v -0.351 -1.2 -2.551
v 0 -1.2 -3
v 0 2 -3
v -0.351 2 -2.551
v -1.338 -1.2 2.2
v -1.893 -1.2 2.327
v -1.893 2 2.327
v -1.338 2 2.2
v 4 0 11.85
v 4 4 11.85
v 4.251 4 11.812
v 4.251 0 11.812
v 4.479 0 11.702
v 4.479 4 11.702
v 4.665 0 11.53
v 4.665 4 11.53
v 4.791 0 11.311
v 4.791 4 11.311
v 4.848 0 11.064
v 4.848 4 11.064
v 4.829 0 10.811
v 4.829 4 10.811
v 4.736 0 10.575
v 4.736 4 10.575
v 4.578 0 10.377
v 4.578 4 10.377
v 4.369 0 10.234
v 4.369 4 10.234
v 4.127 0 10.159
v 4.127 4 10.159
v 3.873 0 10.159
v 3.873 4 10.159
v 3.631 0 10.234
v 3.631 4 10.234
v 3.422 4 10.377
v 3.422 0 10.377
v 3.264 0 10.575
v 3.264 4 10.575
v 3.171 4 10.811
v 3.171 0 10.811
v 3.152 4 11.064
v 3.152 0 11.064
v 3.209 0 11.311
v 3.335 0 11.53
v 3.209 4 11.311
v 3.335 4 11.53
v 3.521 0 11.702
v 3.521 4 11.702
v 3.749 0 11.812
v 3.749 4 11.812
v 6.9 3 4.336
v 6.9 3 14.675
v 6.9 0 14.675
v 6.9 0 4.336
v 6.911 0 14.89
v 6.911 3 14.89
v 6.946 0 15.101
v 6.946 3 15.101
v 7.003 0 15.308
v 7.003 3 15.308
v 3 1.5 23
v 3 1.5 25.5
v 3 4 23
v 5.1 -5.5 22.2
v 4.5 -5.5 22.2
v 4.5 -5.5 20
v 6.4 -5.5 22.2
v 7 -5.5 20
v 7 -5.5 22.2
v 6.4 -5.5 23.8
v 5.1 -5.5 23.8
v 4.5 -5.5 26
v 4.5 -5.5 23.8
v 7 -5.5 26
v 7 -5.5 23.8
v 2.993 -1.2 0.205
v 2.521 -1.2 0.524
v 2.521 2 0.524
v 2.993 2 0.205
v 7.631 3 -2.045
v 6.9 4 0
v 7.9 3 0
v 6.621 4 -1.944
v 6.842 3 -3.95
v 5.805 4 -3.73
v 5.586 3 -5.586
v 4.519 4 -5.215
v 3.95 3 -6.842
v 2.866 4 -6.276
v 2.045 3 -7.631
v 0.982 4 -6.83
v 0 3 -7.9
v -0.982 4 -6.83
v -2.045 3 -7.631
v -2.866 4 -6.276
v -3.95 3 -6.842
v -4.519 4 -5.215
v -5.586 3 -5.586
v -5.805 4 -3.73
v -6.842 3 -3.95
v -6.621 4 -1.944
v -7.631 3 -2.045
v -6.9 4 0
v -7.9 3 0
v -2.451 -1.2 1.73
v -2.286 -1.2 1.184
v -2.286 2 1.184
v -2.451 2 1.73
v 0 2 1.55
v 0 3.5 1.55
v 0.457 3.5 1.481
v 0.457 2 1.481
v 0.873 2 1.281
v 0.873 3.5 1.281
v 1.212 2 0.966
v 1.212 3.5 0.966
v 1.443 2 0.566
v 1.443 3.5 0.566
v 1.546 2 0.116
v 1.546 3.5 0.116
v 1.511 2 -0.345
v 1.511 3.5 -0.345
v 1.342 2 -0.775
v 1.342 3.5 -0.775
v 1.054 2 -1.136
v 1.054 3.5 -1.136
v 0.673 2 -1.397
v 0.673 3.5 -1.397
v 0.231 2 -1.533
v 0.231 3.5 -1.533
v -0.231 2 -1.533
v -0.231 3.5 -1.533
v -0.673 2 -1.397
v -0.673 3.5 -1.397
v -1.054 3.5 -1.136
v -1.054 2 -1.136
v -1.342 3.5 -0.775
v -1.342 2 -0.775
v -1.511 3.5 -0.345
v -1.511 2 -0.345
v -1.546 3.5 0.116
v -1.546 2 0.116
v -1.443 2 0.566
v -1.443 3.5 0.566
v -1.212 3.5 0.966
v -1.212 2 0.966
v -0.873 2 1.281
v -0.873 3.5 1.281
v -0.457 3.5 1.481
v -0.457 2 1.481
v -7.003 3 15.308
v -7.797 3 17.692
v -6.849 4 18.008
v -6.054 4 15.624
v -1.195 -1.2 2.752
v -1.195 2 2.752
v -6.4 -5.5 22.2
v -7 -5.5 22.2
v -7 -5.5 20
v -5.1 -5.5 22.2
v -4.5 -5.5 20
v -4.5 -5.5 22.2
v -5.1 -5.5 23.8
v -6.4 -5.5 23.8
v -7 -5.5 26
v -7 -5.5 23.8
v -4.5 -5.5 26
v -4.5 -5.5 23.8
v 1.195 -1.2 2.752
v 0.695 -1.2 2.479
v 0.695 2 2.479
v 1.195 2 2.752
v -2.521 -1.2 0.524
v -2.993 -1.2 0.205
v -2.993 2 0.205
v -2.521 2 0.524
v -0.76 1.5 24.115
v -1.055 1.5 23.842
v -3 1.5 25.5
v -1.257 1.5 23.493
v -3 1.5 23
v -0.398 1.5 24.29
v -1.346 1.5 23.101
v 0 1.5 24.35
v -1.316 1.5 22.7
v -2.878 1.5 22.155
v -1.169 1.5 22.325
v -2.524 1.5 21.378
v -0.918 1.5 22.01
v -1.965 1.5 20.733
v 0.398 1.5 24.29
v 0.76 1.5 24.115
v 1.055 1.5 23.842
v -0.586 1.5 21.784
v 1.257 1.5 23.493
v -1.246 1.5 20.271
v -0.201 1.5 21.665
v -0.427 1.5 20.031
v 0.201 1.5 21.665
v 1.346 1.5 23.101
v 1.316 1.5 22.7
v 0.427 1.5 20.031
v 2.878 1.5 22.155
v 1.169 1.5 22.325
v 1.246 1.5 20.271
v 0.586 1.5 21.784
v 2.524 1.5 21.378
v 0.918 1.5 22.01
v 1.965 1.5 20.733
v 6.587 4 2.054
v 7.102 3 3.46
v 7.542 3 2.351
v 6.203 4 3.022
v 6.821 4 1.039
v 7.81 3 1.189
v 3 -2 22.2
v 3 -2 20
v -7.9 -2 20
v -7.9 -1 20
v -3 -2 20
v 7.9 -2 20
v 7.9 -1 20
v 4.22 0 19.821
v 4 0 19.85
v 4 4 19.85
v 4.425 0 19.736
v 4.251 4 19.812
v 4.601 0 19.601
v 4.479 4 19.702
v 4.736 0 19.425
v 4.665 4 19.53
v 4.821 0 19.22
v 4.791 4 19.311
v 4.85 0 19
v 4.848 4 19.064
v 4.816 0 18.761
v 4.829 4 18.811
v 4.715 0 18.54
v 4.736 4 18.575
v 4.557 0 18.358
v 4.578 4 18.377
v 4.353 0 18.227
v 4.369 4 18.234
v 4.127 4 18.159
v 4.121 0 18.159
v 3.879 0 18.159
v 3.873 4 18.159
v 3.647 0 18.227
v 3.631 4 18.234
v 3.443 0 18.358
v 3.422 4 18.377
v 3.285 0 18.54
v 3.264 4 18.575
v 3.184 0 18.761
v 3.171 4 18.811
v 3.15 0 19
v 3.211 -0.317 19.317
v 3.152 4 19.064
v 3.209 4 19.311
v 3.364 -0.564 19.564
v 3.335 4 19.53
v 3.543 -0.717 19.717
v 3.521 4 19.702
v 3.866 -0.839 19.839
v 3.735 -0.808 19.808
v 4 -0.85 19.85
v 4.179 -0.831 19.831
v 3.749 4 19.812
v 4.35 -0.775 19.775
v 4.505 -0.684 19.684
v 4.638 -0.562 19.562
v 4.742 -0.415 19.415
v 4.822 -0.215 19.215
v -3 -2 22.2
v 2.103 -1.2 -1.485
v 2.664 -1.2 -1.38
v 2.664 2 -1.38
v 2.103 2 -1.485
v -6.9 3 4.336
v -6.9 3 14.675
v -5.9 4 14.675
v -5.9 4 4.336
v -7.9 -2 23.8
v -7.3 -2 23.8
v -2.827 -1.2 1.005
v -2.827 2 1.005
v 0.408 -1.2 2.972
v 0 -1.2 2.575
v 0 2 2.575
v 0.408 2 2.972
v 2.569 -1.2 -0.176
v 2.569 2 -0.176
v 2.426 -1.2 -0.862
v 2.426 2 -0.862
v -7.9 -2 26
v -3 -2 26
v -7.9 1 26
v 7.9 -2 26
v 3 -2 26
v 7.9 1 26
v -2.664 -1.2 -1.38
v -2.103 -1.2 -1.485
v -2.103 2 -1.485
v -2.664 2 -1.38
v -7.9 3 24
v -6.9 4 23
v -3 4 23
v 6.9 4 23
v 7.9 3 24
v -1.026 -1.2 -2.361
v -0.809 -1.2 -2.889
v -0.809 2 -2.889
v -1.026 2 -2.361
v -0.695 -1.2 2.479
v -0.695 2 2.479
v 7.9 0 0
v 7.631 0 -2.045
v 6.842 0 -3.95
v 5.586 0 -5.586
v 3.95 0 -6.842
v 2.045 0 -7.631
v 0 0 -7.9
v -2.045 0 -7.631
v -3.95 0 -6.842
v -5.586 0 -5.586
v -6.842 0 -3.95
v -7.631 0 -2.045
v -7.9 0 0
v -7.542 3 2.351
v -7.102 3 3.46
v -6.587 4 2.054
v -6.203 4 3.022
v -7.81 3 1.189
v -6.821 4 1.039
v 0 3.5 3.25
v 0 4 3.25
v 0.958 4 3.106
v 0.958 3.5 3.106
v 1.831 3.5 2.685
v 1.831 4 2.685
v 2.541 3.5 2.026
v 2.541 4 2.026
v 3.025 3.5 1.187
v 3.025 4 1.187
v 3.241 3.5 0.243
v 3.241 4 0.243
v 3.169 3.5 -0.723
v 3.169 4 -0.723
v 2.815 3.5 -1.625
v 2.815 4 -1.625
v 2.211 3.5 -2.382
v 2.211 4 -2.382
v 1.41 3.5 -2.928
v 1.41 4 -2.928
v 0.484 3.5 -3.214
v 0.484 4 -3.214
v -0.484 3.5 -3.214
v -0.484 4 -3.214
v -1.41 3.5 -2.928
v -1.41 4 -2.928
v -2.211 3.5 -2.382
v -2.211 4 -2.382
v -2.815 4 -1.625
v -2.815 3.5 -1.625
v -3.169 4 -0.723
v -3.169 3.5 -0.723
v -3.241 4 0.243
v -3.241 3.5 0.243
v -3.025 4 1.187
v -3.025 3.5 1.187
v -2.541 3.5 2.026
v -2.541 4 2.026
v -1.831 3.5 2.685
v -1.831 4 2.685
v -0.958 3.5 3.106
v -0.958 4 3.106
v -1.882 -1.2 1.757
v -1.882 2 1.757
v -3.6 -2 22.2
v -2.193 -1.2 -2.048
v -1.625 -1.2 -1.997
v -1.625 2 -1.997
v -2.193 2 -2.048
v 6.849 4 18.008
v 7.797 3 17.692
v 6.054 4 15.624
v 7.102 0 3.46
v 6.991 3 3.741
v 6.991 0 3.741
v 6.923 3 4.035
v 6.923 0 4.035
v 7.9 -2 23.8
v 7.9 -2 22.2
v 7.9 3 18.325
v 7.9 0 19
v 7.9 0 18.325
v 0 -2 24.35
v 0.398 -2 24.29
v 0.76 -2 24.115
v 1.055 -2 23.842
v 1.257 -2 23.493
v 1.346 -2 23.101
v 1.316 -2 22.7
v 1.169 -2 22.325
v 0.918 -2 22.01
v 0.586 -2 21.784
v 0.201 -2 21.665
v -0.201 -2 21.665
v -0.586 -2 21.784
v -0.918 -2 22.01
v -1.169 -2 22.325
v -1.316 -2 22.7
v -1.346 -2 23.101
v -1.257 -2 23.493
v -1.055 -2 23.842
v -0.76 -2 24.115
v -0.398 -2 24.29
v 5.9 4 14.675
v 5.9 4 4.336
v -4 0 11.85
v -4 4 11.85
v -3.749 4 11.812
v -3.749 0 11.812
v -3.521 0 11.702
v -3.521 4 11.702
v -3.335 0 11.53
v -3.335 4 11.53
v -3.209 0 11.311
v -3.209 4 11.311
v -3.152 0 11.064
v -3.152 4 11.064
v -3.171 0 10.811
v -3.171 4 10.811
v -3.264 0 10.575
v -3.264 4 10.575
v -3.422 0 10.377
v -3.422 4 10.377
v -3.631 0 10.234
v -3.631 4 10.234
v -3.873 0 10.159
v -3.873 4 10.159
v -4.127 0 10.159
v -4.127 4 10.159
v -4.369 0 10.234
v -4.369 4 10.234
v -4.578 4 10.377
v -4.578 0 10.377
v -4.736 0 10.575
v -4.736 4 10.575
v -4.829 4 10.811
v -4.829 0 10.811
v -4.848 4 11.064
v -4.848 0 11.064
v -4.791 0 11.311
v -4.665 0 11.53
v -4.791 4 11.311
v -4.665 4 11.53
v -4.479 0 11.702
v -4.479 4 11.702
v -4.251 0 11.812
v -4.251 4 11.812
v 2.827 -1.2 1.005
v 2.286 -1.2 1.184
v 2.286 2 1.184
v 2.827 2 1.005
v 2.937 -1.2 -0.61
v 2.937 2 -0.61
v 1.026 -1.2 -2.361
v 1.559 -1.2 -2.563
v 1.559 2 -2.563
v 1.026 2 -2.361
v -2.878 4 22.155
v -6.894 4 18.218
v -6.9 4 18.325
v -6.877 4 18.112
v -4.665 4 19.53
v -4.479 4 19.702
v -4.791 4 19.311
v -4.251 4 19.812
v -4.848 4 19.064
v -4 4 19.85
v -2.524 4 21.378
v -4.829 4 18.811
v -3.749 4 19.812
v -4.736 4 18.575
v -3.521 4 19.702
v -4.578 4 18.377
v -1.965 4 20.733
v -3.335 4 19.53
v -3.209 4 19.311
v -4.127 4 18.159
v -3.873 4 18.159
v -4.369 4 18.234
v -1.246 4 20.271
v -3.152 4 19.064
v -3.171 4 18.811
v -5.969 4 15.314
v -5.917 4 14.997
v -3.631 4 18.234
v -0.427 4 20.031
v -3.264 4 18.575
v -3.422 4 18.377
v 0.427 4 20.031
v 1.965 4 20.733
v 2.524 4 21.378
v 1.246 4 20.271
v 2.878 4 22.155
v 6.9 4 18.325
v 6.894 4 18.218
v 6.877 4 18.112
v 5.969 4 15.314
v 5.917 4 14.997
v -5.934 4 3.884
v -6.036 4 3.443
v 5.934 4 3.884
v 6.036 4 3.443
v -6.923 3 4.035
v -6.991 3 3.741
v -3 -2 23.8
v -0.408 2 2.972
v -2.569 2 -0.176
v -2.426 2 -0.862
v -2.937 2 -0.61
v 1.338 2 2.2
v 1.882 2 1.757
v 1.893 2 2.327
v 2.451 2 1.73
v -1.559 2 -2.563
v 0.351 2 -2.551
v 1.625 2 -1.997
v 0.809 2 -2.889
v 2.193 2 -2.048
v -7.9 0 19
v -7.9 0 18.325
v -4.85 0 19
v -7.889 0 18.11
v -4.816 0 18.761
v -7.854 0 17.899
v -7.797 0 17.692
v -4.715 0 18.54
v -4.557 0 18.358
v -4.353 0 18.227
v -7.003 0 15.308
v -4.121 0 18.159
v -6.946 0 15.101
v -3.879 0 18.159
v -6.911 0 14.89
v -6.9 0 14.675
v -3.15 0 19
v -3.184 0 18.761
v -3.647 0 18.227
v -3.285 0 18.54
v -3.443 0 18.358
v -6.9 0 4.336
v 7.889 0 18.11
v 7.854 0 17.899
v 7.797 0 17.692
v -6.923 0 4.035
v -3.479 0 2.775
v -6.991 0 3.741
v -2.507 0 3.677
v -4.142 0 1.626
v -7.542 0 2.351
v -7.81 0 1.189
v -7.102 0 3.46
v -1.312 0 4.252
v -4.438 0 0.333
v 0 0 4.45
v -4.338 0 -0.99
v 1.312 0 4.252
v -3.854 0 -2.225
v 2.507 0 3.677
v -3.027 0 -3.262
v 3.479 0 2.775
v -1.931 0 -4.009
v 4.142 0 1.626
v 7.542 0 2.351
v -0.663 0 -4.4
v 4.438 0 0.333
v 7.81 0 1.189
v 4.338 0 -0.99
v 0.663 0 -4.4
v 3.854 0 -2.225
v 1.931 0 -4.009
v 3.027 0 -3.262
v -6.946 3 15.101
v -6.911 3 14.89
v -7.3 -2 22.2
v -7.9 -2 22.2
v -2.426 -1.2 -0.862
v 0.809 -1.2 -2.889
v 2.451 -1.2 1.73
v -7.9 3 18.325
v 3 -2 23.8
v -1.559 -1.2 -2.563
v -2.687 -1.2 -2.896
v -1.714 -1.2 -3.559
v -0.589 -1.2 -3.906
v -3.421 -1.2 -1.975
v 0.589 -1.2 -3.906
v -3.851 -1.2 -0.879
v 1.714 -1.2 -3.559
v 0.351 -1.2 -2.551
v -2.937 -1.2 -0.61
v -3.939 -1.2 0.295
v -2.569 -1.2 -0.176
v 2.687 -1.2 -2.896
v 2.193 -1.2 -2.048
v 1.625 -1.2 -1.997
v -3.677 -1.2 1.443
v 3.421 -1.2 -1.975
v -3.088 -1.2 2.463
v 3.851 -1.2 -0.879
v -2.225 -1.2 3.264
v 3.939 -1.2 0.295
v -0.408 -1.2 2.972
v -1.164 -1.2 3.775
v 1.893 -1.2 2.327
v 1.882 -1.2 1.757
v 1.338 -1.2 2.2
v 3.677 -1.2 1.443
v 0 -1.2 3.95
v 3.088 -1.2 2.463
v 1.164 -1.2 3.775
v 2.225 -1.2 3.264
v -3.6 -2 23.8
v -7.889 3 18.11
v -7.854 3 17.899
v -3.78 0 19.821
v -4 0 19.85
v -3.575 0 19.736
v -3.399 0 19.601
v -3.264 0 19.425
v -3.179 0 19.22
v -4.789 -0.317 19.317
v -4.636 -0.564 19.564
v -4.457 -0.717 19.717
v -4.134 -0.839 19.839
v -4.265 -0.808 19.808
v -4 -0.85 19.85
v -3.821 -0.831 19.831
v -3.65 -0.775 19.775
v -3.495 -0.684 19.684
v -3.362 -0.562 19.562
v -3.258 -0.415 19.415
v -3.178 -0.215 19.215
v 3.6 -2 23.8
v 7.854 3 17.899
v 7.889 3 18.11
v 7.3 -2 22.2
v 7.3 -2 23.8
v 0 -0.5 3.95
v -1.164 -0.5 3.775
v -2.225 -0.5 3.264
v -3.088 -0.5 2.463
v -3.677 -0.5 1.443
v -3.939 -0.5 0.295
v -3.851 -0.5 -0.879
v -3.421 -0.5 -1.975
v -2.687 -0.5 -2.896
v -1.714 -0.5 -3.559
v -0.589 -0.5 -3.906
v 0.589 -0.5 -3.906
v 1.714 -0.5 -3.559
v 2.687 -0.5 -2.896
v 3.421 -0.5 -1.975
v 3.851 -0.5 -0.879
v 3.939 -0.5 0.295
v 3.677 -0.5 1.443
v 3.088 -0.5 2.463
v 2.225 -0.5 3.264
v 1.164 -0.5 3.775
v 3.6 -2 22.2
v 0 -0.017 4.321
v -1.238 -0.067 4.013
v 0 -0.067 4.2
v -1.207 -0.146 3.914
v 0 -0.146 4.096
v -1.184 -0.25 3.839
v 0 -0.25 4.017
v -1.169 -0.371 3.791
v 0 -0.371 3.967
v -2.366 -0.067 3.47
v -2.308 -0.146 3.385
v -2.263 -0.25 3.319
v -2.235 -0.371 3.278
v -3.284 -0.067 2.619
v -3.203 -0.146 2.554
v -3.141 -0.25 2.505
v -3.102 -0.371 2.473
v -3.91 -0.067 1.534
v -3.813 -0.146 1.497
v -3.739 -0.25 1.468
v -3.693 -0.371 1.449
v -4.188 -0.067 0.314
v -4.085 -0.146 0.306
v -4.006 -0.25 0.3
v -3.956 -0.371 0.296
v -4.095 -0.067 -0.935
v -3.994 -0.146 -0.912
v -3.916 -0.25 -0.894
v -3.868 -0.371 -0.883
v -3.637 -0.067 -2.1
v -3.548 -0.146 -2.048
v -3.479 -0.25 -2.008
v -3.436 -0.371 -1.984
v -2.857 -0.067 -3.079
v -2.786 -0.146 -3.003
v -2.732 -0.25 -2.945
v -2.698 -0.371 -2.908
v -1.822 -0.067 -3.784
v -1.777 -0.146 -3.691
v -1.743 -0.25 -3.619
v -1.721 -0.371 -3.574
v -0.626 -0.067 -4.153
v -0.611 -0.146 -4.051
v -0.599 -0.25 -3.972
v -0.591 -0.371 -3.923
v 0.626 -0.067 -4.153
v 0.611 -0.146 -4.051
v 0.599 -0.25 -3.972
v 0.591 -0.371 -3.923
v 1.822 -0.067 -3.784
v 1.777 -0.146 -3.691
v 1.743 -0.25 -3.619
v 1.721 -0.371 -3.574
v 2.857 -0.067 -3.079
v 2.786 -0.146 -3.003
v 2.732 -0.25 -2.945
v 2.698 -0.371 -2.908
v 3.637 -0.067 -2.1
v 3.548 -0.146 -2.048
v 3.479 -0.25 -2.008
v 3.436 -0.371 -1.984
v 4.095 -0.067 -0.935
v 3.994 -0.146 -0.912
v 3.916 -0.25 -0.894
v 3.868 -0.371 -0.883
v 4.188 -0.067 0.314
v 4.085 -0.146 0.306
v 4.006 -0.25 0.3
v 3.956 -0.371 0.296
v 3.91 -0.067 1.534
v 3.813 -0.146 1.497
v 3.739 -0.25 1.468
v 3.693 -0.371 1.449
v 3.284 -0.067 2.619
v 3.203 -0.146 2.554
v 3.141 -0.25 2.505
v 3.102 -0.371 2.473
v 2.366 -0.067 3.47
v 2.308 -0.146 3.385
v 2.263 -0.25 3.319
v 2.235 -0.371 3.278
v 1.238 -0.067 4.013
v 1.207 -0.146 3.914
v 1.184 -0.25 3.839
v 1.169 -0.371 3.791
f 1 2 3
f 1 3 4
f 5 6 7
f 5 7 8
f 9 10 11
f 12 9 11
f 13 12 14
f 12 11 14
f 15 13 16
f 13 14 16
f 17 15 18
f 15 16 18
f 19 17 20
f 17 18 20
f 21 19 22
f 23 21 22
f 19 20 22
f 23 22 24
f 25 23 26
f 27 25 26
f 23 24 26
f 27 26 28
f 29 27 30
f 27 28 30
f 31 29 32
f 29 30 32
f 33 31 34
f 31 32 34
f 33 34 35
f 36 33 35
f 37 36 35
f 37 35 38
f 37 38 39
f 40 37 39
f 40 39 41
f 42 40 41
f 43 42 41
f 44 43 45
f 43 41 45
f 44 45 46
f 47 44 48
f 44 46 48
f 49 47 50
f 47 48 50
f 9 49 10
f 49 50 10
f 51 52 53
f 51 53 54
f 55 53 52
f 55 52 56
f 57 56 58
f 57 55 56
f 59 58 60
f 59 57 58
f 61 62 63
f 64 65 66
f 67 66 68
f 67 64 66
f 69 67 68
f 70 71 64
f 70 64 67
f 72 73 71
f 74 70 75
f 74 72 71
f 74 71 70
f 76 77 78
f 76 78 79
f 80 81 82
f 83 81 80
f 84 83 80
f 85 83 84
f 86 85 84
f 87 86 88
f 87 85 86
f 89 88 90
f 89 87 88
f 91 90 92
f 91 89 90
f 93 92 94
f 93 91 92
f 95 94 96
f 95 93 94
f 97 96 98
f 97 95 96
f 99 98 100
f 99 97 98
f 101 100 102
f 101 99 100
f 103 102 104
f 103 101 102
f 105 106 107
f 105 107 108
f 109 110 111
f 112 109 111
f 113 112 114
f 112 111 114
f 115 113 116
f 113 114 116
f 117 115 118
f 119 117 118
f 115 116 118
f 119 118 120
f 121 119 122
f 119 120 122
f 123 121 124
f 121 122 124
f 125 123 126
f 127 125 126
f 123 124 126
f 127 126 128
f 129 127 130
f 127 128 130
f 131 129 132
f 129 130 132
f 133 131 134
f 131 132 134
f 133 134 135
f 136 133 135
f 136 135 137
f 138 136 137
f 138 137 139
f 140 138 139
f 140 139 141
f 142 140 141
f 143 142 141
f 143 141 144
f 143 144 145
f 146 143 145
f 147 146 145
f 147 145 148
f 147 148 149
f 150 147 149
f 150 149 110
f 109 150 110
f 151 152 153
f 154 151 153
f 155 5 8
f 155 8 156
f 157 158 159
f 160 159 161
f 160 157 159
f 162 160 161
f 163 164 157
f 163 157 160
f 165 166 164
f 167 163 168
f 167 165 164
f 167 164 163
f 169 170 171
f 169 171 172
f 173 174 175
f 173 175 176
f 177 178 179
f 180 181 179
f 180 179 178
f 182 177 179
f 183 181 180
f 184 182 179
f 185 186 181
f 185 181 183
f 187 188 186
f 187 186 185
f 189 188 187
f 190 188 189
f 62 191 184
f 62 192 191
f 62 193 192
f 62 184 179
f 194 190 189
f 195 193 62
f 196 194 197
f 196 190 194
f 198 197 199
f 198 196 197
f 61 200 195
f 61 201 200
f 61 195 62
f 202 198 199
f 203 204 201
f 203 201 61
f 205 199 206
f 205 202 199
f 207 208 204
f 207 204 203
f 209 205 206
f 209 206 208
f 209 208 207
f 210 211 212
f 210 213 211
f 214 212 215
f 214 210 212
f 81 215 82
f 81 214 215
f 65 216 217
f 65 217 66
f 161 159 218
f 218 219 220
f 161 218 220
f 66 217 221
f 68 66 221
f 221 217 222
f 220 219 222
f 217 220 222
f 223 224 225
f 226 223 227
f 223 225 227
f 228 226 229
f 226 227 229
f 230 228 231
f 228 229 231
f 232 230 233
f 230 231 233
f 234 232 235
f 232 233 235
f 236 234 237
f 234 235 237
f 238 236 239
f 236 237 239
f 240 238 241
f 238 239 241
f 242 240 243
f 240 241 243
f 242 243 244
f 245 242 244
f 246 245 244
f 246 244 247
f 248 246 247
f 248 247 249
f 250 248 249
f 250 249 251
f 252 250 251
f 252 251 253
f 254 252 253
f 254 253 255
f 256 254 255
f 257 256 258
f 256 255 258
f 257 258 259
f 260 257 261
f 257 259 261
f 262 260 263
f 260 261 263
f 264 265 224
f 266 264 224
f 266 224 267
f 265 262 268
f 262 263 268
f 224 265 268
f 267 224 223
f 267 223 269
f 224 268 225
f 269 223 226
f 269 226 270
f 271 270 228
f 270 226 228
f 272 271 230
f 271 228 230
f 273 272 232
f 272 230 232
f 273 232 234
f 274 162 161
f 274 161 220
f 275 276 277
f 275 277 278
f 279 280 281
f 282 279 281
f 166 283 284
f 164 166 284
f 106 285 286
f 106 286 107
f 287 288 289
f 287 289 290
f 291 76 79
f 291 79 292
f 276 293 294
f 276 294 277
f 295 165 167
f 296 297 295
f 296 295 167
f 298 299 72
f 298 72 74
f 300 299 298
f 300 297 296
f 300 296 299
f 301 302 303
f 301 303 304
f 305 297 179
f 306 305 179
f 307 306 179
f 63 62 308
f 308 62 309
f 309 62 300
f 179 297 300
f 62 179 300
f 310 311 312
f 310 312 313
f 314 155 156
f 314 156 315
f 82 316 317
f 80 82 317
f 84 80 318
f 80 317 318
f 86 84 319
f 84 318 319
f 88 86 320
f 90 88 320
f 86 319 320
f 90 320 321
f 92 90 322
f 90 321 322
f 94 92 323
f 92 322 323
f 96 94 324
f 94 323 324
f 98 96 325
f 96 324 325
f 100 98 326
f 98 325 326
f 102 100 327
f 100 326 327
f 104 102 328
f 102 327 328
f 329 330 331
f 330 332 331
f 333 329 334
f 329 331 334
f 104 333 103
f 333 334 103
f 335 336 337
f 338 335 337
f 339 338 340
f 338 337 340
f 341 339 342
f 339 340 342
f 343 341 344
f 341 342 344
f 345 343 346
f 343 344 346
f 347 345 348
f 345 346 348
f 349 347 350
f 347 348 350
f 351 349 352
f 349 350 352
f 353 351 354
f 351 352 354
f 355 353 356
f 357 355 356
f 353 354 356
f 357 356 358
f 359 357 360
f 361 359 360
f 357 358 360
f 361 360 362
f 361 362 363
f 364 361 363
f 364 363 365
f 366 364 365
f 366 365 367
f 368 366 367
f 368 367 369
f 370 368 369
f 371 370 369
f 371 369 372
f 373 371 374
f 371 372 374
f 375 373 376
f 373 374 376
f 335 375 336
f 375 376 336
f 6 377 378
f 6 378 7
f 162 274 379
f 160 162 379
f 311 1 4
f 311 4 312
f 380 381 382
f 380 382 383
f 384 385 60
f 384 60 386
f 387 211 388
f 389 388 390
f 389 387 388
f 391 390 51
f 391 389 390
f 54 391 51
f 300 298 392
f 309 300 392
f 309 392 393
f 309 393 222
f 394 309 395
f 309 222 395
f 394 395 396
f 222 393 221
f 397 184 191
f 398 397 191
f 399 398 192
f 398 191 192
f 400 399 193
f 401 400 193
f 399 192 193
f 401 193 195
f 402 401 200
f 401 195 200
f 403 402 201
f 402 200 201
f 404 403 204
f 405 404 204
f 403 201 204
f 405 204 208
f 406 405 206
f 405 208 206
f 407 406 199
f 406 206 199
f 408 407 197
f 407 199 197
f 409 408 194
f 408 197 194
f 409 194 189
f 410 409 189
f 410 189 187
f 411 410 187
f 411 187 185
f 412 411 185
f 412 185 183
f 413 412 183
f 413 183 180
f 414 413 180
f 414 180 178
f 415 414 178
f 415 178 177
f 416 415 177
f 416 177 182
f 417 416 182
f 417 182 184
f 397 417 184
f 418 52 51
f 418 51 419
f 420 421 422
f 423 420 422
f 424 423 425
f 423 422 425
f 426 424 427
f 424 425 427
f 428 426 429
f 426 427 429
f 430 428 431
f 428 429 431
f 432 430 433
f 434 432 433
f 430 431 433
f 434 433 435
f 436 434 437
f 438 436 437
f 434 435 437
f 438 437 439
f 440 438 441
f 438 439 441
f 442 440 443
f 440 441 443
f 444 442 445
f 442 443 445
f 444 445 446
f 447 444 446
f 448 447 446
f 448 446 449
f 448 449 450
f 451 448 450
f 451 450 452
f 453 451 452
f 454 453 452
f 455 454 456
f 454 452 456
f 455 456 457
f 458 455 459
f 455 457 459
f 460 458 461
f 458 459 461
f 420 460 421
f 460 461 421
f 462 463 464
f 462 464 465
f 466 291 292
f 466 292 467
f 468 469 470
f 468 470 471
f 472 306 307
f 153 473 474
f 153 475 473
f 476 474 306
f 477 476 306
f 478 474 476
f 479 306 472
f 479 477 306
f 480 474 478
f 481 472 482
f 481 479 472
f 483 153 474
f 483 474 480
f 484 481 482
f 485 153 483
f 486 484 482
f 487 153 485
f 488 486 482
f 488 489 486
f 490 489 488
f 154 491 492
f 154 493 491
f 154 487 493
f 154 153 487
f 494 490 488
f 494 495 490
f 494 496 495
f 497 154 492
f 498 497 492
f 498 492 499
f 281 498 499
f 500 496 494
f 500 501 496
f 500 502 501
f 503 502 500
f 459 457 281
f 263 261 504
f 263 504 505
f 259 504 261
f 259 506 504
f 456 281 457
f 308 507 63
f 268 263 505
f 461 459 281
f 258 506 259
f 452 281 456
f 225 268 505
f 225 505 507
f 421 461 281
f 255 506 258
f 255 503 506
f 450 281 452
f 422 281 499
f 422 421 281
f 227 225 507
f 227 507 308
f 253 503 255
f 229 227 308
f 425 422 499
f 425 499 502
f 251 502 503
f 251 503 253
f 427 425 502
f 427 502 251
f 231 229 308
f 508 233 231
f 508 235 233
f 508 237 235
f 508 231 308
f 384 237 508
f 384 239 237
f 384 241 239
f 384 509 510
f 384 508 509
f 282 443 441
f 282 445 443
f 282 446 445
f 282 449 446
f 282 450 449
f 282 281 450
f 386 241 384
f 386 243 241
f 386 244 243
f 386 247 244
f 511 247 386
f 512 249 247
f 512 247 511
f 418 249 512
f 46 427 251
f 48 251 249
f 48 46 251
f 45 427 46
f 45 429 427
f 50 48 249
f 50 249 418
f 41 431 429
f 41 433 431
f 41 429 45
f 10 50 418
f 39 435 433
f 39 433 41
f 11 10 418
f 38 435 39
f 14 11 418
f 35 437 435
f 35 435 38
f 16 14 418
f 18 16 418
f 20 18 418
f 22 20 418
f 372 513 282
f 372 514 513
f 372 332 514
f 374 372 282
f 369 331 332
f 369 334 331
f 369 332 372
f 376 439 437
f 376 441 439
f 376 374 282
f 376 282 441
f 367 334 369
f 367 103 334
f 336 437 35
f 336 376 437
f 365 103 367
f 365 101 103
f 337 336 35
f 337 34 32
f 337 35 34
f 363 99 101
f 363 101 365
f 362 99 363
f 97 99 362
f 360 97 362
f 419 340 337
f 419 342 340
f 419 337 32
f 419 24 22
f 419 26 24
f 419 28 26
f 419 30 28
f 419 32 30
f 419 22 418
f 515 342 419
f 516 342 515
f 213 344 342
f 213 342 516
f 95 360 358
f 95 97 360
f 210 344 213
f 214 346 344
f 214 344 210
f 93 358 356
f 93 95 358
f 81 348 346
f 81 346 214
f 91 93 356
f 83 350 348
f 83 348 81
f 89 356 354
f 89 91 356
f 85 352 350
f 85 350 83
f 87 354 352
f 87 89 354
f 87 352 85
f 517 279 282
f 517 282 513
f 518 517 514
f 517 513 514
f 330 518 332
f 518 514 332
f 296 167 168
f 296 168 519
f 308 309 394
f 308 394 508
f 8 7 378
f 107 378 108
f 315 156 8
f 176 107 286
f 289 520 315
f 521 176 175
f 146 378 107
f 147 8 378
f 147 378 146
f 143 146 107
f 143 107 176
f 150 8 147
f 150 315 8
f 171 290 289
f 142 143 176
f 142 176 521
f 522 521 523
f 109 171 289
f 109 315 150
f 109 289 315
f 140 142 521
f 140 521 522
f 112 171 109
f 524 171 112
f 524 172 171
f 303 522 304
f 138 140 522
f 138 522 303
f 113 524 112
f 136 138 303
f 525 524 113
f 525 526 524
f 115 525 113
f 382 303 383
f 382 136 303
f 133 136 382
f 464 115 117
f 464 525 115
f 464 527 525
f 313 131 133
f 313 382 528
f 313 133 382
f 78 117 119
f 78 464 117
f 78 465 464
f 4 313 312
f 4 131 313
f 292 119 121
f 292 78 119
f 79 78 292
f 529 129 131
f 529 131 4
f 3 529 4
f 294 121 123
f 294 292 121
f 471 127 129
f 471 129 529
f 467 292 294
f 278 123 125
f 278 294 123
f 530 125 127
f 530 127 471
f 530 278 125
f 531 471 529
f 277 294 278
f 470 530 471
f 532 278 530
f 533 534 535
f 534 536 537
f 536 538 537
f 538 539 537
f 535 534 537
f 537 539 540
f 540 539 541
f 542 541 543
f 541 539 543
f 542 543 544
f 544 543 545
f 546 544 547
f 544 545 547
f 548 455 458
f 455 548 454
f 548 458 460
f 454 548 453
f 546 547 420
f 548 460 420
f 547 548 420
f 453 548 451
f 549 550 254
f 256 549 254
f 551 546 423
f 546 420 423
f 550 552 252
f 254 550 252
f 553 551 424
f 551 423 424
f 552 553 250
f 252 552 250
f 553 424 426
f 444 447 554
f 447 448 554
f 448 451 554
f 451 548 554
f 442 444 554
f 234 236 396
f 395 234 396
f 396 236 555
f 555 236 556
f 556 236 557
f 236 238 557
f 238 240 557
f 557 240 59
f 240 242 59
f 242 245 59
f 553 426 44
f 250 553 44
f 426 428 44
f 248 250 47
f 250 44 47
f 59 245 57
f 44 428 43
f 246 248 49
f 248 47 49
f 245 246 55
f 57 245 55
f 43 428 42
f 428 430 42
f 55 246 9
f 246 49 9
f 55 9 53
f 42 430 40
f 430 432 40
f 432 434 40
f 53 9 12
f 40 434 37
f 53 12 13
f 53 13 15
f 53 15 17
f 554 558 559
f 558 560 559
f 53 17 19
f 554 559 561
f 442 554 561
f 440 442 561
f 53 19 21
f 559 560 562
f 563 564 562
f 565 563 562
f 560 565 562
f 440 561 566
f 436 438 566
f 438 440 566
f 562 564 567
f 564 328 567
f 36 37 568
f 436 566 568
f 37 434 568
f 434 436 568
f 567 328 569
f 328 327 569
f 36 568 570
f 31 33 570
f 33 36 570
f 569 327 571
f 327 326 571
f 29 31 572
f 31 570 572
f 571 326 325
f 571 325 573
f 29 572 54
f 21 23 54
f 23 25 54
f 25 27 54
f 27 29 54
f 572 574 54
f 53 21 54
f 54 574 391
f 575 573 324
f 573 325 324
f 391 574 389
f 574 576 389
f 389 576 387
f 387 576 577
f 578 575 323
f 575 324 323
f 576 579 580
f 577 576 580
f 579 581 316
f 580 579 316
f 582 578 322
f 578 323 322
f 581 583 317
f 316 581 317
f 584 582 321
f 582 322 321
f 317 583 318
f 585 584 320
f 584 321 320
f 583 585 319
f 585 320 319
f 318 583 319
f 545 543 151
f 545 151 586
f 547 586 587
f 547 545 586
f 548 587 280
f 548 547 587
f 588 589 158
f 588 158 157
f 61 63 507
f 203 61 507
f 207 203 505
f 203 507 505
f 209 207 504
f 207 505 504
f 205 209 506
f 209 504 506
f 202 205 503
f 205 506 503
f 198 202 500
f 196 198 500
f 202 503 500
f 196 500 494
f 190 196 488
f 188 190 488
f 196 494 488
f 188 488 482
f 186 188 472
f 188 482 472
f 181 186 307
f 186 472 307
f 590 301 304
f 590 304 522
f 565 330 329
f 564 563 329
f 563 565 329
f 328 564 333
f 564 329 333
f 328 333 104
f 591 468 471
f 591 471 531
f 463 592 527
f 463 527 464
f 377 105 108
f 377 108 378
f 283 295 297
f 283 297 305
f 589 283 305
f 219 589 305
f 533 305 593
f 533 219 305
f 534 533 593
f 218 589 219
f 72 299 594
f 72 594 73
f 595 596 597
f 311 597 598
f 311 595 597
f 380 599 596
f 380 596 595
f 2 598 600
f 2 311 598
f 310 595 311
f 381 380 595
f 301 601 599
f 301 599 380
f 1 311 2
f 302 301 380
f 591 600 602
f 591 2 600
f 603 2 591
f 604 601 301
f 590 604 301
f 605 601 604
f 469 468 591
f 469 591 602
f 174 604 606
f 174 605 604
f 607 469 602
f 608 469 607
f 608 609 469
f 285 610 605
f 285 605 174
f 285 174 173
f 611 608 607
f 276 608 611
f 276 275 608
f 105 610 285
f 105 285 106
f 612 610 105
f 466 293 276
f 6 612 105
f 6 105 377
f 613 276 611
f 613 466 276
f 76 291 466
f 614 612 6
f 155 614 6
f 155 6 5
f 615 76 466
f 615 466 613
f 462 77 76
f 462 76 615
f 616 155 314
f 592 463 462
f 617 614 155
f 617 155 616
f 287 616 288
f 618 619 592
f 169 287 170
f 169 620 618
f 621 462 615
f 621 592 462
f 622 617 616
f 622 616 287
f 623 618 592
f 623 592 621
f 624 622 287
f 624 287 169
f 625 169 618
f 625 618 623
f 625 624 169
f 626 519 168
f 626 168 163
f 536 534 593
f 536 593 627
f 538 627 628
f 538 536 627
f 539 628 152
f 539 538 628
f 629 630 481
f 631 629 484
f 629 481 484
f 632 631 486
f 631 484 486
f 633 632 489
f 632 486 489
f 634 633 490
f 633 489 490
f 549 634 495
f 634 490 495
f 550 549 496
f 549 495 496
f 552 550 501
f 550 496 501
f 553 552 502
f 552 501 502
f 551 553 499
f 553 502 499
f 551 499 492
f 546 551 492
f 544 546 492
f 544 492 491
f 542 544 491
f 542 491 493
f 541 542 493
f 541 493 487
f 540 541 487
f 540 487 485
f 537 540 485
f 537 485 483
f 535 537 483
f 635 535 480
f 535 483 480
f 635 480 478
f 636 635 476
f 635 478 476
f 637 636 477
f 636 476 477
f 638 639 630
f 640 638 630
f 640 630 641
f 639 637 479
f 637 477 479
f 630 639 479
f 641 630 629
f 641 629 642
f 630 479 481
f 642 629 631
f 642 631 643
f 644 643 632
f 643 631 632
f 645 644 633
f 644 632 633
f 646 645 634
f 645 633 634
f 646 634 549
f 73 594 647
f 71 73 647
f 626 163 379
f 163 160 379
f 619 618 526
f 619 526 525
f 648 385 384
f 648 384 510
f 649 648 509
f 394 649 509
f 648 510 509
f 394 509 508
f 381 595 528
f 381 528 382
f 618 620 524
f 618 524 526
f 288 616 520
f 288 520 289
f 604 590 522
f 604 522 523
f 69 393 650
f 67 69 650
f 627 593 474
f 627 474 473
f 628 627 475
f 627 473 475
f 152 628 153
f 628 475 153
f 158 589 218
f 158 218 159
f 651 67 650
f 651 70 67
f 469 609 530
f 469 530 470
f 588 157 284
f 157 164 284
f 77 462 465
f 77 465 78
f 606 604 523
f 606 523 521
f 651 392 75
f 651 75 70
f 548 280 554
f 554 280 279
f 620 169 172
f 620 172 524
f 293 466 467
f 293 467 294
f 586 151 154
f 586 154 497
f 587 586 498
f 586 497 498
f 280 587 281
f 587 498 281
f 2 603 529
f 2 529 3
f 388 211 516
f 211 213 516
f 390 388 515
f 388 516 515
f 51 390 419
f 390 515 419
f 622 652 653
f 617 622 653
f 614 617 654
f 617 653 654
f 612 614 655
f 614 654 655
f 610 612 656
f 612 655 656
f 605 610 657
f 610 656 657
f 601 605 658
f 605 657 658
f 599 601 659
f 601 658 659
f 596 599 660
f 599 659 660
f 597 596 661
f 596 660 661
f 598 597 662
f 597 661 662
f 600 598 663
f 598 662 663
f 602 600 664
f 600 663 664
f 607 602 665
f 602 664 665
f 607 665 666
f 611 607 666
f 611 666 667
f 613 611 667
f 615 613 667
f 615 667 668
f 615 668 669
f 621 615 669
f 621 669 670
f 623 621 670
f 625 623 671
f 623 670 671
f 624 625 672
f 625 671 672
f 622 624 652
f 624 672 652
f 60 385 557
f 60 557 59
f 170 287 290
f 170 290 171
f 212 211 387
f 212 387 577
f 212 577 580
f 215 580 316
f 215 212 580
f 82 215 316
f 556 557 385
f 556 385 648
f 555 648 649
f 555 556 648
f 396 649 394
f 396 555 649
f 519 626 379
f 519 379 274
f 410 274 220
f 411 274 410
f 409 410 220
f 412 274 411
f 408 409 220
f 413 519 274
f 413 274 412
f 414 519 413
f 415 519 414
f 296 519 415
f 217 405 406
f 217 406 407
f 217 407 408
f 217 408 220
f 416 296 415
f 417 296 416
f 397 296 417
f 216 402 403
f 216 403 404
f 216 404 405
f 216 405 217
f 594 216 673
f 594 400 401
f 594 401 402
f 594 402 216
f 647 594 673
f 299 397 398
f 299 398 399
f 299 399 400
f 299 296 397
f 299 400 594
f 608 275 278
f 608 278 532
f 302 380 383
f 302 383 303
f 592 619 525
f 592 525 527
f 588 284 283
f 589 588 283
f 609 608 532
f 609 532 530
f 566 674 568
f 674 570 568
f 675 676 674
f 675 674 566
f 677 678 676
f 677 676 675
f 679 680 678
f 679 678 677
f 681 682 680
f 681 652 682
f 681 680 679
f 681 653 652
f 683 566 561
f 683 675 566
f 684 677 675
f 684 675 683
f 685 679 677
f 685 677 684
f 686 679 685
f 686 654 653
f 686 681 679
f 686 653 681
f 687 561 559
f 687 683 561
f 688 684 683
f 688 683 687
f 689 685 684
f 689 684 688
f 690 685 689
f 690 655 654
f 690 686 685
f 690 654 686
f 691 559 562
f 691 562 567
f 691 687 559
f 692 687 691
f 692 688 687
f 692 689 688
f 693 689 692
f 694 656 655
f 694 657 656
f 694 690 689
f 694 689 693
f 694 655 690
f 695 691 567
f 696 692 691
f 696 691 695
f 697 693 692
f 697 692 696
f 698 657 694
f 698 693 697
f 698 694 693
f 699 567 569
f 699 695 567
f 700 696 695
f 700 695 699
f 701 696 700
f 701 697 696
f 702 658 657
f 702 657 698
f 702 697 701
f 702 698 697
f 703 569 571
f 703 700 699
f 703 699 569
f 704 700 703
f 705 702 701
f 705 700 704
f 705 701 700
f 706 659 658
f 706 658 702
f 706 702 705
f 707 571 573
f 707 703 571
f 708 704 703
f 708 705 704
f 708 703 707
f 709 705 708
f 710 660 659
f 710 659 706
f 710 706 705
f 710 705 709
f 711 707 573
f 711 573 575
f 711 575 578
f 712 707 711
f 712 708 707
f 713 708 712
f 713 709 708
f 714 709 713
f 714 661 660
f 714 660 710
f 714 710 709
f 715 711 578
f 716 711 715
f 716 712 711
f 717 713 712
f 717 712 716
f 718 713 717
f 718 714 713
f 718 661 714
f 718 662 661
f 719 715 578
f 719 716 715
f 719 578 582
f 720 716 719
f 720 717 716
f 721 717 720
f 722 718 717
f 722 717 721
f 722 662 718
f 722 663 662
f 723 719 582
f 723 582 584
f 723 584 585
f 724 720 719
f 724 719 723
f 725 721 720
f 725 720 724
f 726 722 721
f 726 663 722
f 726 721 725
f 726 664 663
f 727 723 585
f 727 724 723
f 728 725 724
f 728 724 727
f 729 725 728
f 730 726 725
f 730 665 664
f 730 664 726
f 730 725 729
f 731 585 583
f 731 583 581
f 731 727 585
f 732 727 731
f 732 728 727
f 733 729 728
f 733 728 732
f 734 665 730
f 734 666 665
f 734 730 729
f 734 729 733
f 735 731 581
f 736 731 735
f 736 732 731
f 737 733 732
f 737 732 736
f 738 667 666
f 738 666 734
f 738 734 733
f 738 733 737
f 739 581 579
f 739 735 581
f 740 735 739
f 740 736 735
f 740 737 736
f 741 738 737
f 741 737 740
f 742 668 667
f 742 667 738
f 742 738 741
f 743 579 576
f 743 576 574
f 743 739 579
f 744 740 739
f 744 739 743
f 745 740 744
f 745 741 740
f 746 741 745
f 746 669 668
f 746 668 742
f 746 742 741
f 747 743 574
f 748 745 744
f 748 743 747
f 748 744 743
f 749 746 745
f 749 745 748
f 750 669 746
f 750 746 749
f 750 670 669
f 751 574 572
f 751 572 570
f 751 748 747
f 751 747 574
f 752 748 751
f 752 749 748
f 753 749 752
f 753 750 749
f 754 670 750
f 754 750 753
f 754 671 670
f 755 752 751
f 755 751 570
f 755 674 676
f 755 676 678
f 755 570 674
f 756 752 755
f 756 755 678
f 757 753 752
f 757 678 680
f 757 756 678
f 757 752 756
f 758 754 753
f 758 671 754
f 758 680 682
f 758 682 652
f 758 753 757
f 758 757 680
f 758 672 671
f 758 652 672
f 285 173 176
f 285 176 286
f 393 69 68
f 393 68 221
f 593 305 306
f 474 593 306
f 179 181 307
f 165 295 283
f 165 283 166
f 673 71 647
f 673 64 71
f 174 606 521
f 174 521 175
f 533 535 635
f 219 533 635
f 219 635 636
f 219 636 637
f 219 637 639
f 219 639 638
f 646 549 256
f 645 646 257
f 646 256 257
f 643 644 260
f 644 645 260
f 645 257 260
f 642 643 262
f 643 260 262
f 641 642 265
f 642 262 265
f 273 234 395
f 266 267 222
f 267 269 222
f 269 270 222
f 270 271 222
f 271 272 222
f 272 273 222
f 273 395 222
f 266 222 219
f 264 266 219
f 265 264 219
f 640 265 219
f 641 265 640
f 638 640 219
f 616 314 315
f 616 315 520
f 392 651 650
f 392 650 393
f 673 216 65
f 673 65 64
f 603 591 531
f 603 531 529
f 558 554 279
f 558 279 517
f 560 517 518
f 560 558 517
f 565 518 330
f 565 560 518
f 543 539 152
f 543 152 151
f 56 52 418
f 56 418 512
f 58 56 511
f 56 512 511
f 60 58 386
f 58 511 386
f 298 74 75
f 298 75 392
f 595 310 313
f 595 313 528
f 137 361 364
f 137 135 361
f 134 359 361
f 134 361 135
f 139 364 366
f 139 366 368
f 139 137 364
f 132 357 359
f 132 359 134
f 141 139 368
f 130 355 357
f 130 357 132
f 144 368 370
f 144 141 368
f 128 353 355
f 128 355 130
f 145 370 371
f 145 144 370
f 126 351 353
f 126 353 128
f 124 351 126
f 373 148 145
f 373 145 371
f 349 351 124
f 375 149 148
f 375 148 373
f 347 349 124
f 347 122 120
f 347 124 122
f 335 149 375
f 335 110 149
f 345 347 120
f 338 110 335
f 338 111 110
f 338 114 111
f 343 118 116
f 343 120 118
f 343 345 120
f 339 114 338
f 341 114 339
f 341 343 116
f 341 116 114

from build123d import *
from build123d.topology import SkipClean

# Parameters (mm, degrees)
EXTRUDE_1_DEPTH          = 4
EXTRUDE_3_DEPTH          = 6
CHAMFER_1_SIZE           = 3
SKETCH_5_R               = 0.85
CUT_EXTRUDE_1_DEPTH      = 4
PATTERN_LINEAR_1_COUNT   = 2
PATTERN_LINEAR_1_PITCH   = 8
CUT_EXTRUDE_2_DEPTH      = 2.5
CUT_EXTRUDE_3_REACH      = 30.061
SKETCH_7_R               = 1.35
SKETCH_8_R               = 3.95
EXTRUDE_4_DEPTH          = 1.2
SKETCH_9_R               = 3.25
CUT_EXTRUDE_4_DEPTH      = 0.5
SKETCH_10_R              = 1.55
CUT_EXTRUDE_5_DEPTH      = 29.786455148
FILLET_1_R               = 0.5
SKETCH_11_R              = 3
CUT_EXTRUDE_6_DEPTH      = 3.2
EXTRUDE_5_DEPTH          = 3.2
PATTERN_CIRCULAR_1_COUNT = 23
CUT_EXTRUDE_7_DEPTH      = 0.8
CUT_EXTRUDE_8_DEPTH      = 29.786455148
FILLET_2_R               = 2
CHAMFER_2_SIZE           = 1


with BuildPart() as part:
    # ｽｹｯﾁ1 → ﾎﾞｽ - 押し出し1 (new body)
    with BuildSketch(Plane(origin=(0, 0, 0), x_dir=(1, 0, 0), z_dir=(0, 1, 0))):
        with BuildLine():
            Line((-7.9, 0), (-7.9, -26))
            Line((-7.9, -26), (7.9, -26))
            Line((7.9, -26), (7.9, 0))
            ThreePointArc((7.9, 0), (0, 7.9), (-7.9, 0))
        make_face()
    extrude(amount=EXTRUDE_1_DEPTH)

    # ｽｹｯﾁ4 → ﾎﾞｽ - 押し出し3 (add)
    with BuildSketch(Plane.XY.offset(26)):
        Polygon((-7, -5.5), (-4.5, -5.5), (-3, -2), (3, -2), (4.5, -5.5), (7, -5.5), (7.9, -2), (7.9, 0), (-7.9, 0), (-7.9, -2), align=None)
    extrude(amount=-EXTRUDE_3_DEPTH)

    # 面取り1
    chamfer_1_edges = [part.edges().sort_by_distance(p)[0] for p in [
        (0, 4, 26),
    ]]
    chamfer(chamfer_1_edges, length=CHAMFER_1_SIZE)

    # ｽｹｯﾁ5 → ｶｯﾄ - 押し出し1 (cut)
    with BuildSketch(Plane(origin=(0, 4, 0), x_dir=(1, 0, 0), z_dir=(0, 1, 0))):
        with Locations(Location((-4, -19, 0), (0, 0, 270))):
            Circle(SKETCH_5_R)
        with Locations(Location((4, -19, 0), (0, 0, 270))):
            Circle(SKETCH_5_R)
    cut_extrude_1 = extrude(amount=-CUT_EXTRUDE_1_DEPTH, mode=Mode.SUBTRACT)

    # 直線ﾊﾟﾀｰﾝ1: ｶｯﾄ - 押し出し1 ×2
    with Locations(*[(0, 0, -i * PATTERN_LINEAR_1_PITCH) for i in range(1, PATTERN_LINEAR_1_COUNT)]):
        add(cut_extrude_1, mode=Mode.SUBTRACT)

    # ｽｹｯﾁ6 → ｶｯﾄ - 押し出し2 (cut)
    with BuildSketch(Plane(origin=(0, 4, 0), x_dir=(1, 0, 0), z_dir=(0, 1, 0))):
        with BuildLine():
            Line((-3, -23), (-3, -27))
            Line((-3, -27), (3, -27))
            Line((3, -27), (3, -23))
            ThreePointArc((3, -23), (0, -20), (-3, -23))
        make_face()
    extrude(amount=-CUT_EXTRUDE_2_DEPTH, mode=Mode.SUBTRACT)

    # ｽｹｯﾁ7 → ｶｯﾄ - 押し出し3 (cut, up to next)
    with BuildSketch(Plane(origin=(0, 1.5, 0), x_dir=(1, 0, 0), z_dir=(0, 1, 0)), mode=Mode.PRIVATE) as cut_extrude_3_sk1:
        with Locations(Location((0, -23, 0), (0, 0, 270))):
            Circle(SKETCH_7_R)
    cut_extrude_3_tool1 = extrude(cut_extrude_3_sk1.sketch, amount=-CUT_EXTRUDE_3_REACH, mode=Mode.PRIVATE) & part.part
    add(cut_extrude_3_tool1.solids().sort_by_distance((0, 1.5, 23))[0], mode=Mode.SUBTRACT)

    # ｽｹｯﾁ8 → ﾎﾞｽ - 押し出し4 (add)
    with BuildSketch(Plane.XZ):
        with Locations(Location((0, 0, 0), (0, 0, 90))):
            Circle(SKETCH_8_R)
    extrude(amount=EXTRUDE_4_DEPTH)

    # ｽｹｯﾁ9 → ｶｯﾄ - 押し出し4 (cut)
    with BuildSketch(Plane(origin=(0, 4, 0), x_dir=(1, 0, 0), z_dir=(0, 1, 0))):
        with Locations(Location((0, 0, 0), (0, 0, 270))):
            Circle(SKETCH_9_R)
    extrude(amount=-CUT_EXTRUDE_4_DEPTH, mode=Mode.SUBTRACT)

    # ｽｹｯﾁ10 → ｶｯﾄ - 押し出し5 (cut, through all)
    with BuildSketch(Plane(origin=(0, 4, 0), x_dir=(1, 0, 0), z_dir=(0, 1, 0))):
        with Locations(Location((0, 0, 0), (0, 0, 270))):
            Circle(SKETCH_10_R)
    extrude(amount=-CUT_EXTRUDE_5_DEPTH, mode=Mode.SUBTRACT)

    # ﾌｨﾚｯﾄ1
    fillet_1_edges = [part.edges().sort_by_distance(p)[0] for p in [
        (0, 0, -3.95),
    ]]
    fillet(fillet_1_edges, radius=FILLET_1_R)

    # ｽｹｯﾁ11 → ｶｯﾄ - 押し出し6 (cut)
    with BuildSketch(Plane.XZ.offset(1.2)):
        with Locations(Location((0, 0, 0), (0, 0, 270))):
            Circle(SKETCH_11_R)
    extrude(amount=-CUT_EXTRUDE_6_DEPTH, mode=Mode.SUBTRACT)

    # ｽｹｯﾁ12 → ﾎﾞｽ - 押し出し5 (add)
    with BuildSketch(Plane.XZ.offset(1.2)):
        with BuildLine():
            Line((-0.408499947, 2.972057838), (0, 2.574530741))
            Line((0, 2.574530741), (0.408499947, 2.972057838))
            ThreePointArc((0.408499947, 2.972057838), (0, 3), (-0.408499947, 2.972057838))
        make_face()
    extrude_5 = extrude(amount=-EXTRUDE_5_DEPTH)

    # 円形ﾊﾟﾀｰﾝ1: ﾎﾞｽ - 押し出し5 ×23 about axis
    pattern_circular_1_axis = Axis((0, 0, 0), (0, 1, 0))
    for i in range(1, PATTERN_CIRCULAR_1_COUNT):
        add(extrude_5.rotate(pattern_circular_1_axis, i * 360 / PATTERN_CIRCULAR_1_COUNT))

    # ｽｹｯﾁ13 → ｶｯﾄ - 押し出し7 (cut, symmetric)
    with BuildSketch(Plane.XY.offset(23)):
        Polygon((3, -2), (4.5, -5.5), (5.1, -5.5), (3.6, -2), align=None)
        Polygon((7.9, -2), (7, -5.5), (6.4, -5.5), (7.3, -2), align=None)
    cut_extrude_7 = extrude(amount=CUT_EXTRUDE_7_DEPTH, both=True, mode=Mode.SUBTRACT)

    # ﾐﾗｰ1: ｶｯﾄ - 押し出し7 across plane
    add(cut_extrude_7.mirror(Plane(origin=(0, 0, 0), x_dir=(0, 0, 1), z_dir=(1, 0, 0))), mode=Mode.SUBTRACT)

    # ｽｹｯﾁ14 → ｶｯﾄ - 押し出し8 (cut, through all)
    with SkipClean():  # the faces are left unmerged after this step: merging them gives an invalid solid
        with BuildSketch(Plane(origin=(0, 4, 0), x_dir=(1, 0, 0), z_dir=(0, 1, 0))):
            with BuildLine():
                Line((-7.9, 0), (-7.9, -18))
                Line((-7.9, -18), (-6.9, -15))
                Line((-6.9, -15), (-6.9, -3.847076812))
                ThreePointArc((-6.9, -3.847076812), (-7.645913941, -1.987460691), (-7.9, 0))
            make_face()
        cut_extrude_8 = extrude(amount=-CUT_EXTRUDE_8_DEPTH, mode=Mode.SUBTRACT)

    # ﾐﾗｰ2: ｶｯﾄ - 押し出し8 across plane
    with SkipClean():  # the faces are left unmerged after this step: merging them gives an invalid solid
        add(cut_extrude_8.mirror(Plane(origin=(0, 0, 0), x_dir=(0, 0, 1), z_dir=(1, 0, 0))), mode=Mode.SUBTRACT)

    # ﾌｨﾚｯﾄ2
    fillet_2_edges = [part.edges().sort_by_distance(p)[0] for p in [
        (-6.9, 2, 3.847076812),
        (-6.9, 2, 15),
        (-7.9, 2, 18),
        (6.9, 2, 3.847076812),
        (7.9, 2, 18),
        (6.9, 2, 15),
    ]]
    fillet(fillet_2_edges, radius=FILLET_2_R)

    # 面取り2
    # the kernel refuses this chamfer: 1 mm, written as the material it adds along each edge
    with BuildSketch(Plane(origin=(7.9, 0, 20), x_dir=(0, 0.02749587661058639, -0.9996219169112968), z_dir=(-1, 0, 0))) as chamfer_2_piece_1_section:
        Polygon((CHAMFER_2_SIZE * 0.999621916911, CHAMFER_2_SIZE * 0.0274958766106), (-CHAMFER_2_SIZE * 0.0274958766106, CHAMFER_2_SIZE * 0.999621916911), (0, 0), align=None)
    chamfer_2_piece_1 = extrude(amount=15.8, mode=Mode.PRIVATE)
    chamfer_2_piece_1 = chamfer_2_piece_1 - Plane(origin=(-4, -0.34097177, 19), x_dir=(0, 0, 1), z_dir=(0, 1, 0)) * Cylinder(0.85, 36, mode=Mode.PRIVATE)
    chamfer_2_piece_1 = chamfer_2_piece_1 - Plane(origin=(4, -0.34097177, 19), x_dir=(0, 0, 1), z_dir=(0, 1, 0)) * Cylinder(0.85, 36, mode=Mode.PRIVATE)
    add(chamfer_2_piece_1)
    # the kernel refuses this chamfer: 1 mm, written as the material it takes off along each edge
    with BuildSketch(Plane(origin=(-7.9, 4, 18.32455532), x_dir=(-0.027495876610586487, -0.9996219169112968, 0), z_dir=(0, 0, 1)), Plane(origin=(7.9, 4, 25.571682988), x_dir=(0.027495876610586487, -0.9996219169112968, 0), z_dir=(0, 0, -1))) as chamfer_2_2_piece_1:
        Polygon((CHAMFER_2_SIZE * 0.999621916911, CHAMFER_2_SIZE * 0.0274958766106), (-CHAMFER_2_SIZE * 0.0274958766106, CHAMFER_2_SIZE * 0.999621916911), (0, 0), align=None)
    extrude(amount=7.247127668, mode=Mode.SUBTRACT)
    with BuildSketch(Plane(origin=(0, 4, 0), x_dir=(1, 0, 0), z_dir=(0, 0, 1))) as chamfer_2_2_piece_2:
        Polygon((7.9, -CHAMFER_2_SIZE), (7.9 - CHAMFER_2_SIZE, 0), (7.9, 0), align=None)
    revolve(axis=Axis((0, 4, 0), (0, 1, 0)), revolution_arc=180, mode=Mode.SUBTRACT)
    with BuildSketch(Plane(origin=(-5.9, 4, 18.32455532), x_dir=(-1, 0, 0), z_dir=(0, 0, 1))) as chamfer_2_2_piece_3:
        Polygon((2, CHAMFER_2_SIZE), (2 - CHAMFER_2_SIZE, 0), (2, 0), align=None)
    revolve(axis=Axis((-5.9, 4, 18.32455532), (0, -1, 0)), revolution_arc=18.434948823, mode=Mode.SUBTRACT)
    with BuildSketch(Plane(origin=(-7.797366596, 4, 17.692099788), x_dir=(-0.026084878905721698, -0.9996219169112968, -0.008694959635240574), z_dir=(0.3162277660168382, 0, -0.9486832980505138))) as chamfer_2_2_piece_4:
        Polygon((CHAMFER_2_SIZE * 0.999621916911, -CHAMFER_2_SIZE * 0.0274958766106), (-CHAMFER_2_SIZE * 0.0274958766106, -CHAMFER_2_SIZE * 0.999621916911), (0, 0), align=None)
    extrude(amount=2.513167019, mode=Mode.SUBTRACT)
    with BuildSketch(Plane(origin=(-8.9, 4, 14.67544468), x_dir=(0.9486832980505138, 0, 0.31622776601683794), z_dir=(-0.31622776601683794, 0, 0.9486832980505138))) as chamfer_2_2_piece_5:
        Polygon((2, -CHAMFER_2_SIZE), (2 + CHAMFER_2_SIZE, 0), (2, 0), align=None)
    revolve(axis=Axis((-8.9, 4, 14.67544468), (0, 1, 0)), revolution_arc=18.434948823, mode=Mode.SUBTRACT)
    with BuildSketch(Plane(origin=(-6.9, 4, 14.67544468), x_dir=(-0.027495876610586487, -0.9996219169112968, 0), z_dir=(0, 0, -1))) as chamfer_2_2_piece_6:
        Polygon((CHAMFER_2_SIZE * 0.999621916911, -CHAMFER_2_SIZE * 0.0274958766106), (-CHAMFER_2_SIZE * 0.0274958766106, -CHAMFER_2_SIZE * 0.999621916911), (0, 0), align=None)
    extrude(amount=10.339548002, mode=Mode.SUBTRACT)
    with BuildSketch(Plane(origin=(-8.9, 4, 4.335896678), x_dir=(1, 0, 0), z_dir=(0, 0, 1))) as chamfer_2_2_piece_7:
        Polygon((2, -CHAMFER_2_SIZE), (2 + CHAMFER_2_SIZE, 0), (2, 0), align=None)
    revolve(axis=Axis((-8.9, 4, 4.335896678), (0, 1, 0)), revolution_arc=25.974390018, mode=Mode.SUBTRACT)
    with BuildSketch(Plane(origin=(8.9, 4, 4.335896678), x_dir=(-0.8989898989898986, 0, -0.43796936138745124), z_dir=(0.43796936138745124, 0, -0.8989898989898986))) as chamfer_2_2_piece_8:
        Polygon((2, -CHAMFER_2_SIZE), (2 + CHAMFER_2_SIZE, 0), (2, 0), align=None)
    revolve(axis=Axis((8.9, 4, 4.335896678), (0, 1, 0)), revolution_arc=25.974390018, mode=Mode.SUBTRACT)
    with BuildSketch(Plane(origin=(6.9, 4, 14.67544468), x_dir=(0.027495876610586487, -0.9996219169112968, 0), z_dir=(0, 0, -1))) as chamfer_2_2_piece_9:
        Polygon((CHAMFER_2_SIZE * 0.999621916911, CHAMFER_2_SIZE * 0.0274958766106), (-CHAMFER_2_SIZE * 0.0274958766106, CHAMFER_2_SIZE * 0.999621916911), (0, 0), align=None)
    extrude(amount=10.339548002, mode=Mode.SUBTRACT)
    with BuildSketch(Plane(origin=(8.9, 4, 14.67544468), x_dir=(-1, 0, 0), z_dir=(0, 0, -1))) as chamfer_2_2_piece_10:
        Polygon((2, -CHAMFER_2_SIZE), (2 + CHAMFER_2_SIZE, 0), (2, 0), align=None)
    revolve(axis=Axis((8.9, 4, 14.67544468), (0, 1, 0)), revolution_arc=18.434948823, mode=Mode.SUBTRACT)
    with BuildSketch(Plane(origin=(7.797366596, 4, 17.692099788), x_dir=(0.02608487890572092, -0.9996219169112968, -0.008694959635240314), z_dir=(-0.3162277660168382, 0, -0.9486832980505138))) as chamfer_2_2_piece_11:
        Polygon((CHAMFER_2_SIZE * 0.999621916911, CHAMFER_2_SIZE * 0.0274958766106), (-CHAMFER_2_SIZE * 0.0274958766106, CHAMFER_2_SIZE * 0.999621916911), (0, 0), align=None)
    extrude(amount=2.513167019, mode=Mode.SUBTRACT)
    with BuildSketch(Plane(origin=(5.9, 4, 18.32455532), x_dir=(0.9486832980505135, 0, -0.3162277660168389), z_dir=(-0.3162277660168389, 0, -0.9486832980505135))) as chamfer_2_2_piece_12:
        Polygon((2, CHAMFER_2_SIZE), (2 - CHAMFER_2_SIZE, 0), (2, 0), align=None)
    revolve(axis=Axis((5.9, 4, 18.32455532), (0, -1, 0)), revolution_arc=18.434948823, mode=Mode.SUBTRACT)
    with BuildSketch(Plane(origin=(0, 4, 0), x_dir=(0.8989898989898988, 0, 0.43796936138745096), z_dir=(-0.43796936138745096, 0, 0.8989898989898988))) as chamfer_2_2_piece_13:
        Polygon((7.9, -CHAMFER_2_SIZE), (7.9 - CHAMFER_2_SIZE, 0), (7.9, 0), align=None)
    revolve(axis=Axis((0, 4, 0), (0, 1, 0)), revolution_arc=25.974390018, mode=Mode.SUBTRACT)
    with BuildSketch(Plane(origin=(0, 4, 0), x_dir=(-0.8989898989898988, 0, 0.43796936138745096), z_dir=(0.43796936138745096, 0, 0.8989898989898988))) as chamfer_2_2_piece_14:
        Polygon((7.9, CHAMFER_2_SIZE), (7.9 - CHAMFER_2_SIZE, 0), (7.9, 0), align=None)
    revolve(axis=Axis((0, 4, 0), (0, -1, 0)), revolution_arc=25.974390018, mode=Mode.SUBTRACT)


solid = part.part
